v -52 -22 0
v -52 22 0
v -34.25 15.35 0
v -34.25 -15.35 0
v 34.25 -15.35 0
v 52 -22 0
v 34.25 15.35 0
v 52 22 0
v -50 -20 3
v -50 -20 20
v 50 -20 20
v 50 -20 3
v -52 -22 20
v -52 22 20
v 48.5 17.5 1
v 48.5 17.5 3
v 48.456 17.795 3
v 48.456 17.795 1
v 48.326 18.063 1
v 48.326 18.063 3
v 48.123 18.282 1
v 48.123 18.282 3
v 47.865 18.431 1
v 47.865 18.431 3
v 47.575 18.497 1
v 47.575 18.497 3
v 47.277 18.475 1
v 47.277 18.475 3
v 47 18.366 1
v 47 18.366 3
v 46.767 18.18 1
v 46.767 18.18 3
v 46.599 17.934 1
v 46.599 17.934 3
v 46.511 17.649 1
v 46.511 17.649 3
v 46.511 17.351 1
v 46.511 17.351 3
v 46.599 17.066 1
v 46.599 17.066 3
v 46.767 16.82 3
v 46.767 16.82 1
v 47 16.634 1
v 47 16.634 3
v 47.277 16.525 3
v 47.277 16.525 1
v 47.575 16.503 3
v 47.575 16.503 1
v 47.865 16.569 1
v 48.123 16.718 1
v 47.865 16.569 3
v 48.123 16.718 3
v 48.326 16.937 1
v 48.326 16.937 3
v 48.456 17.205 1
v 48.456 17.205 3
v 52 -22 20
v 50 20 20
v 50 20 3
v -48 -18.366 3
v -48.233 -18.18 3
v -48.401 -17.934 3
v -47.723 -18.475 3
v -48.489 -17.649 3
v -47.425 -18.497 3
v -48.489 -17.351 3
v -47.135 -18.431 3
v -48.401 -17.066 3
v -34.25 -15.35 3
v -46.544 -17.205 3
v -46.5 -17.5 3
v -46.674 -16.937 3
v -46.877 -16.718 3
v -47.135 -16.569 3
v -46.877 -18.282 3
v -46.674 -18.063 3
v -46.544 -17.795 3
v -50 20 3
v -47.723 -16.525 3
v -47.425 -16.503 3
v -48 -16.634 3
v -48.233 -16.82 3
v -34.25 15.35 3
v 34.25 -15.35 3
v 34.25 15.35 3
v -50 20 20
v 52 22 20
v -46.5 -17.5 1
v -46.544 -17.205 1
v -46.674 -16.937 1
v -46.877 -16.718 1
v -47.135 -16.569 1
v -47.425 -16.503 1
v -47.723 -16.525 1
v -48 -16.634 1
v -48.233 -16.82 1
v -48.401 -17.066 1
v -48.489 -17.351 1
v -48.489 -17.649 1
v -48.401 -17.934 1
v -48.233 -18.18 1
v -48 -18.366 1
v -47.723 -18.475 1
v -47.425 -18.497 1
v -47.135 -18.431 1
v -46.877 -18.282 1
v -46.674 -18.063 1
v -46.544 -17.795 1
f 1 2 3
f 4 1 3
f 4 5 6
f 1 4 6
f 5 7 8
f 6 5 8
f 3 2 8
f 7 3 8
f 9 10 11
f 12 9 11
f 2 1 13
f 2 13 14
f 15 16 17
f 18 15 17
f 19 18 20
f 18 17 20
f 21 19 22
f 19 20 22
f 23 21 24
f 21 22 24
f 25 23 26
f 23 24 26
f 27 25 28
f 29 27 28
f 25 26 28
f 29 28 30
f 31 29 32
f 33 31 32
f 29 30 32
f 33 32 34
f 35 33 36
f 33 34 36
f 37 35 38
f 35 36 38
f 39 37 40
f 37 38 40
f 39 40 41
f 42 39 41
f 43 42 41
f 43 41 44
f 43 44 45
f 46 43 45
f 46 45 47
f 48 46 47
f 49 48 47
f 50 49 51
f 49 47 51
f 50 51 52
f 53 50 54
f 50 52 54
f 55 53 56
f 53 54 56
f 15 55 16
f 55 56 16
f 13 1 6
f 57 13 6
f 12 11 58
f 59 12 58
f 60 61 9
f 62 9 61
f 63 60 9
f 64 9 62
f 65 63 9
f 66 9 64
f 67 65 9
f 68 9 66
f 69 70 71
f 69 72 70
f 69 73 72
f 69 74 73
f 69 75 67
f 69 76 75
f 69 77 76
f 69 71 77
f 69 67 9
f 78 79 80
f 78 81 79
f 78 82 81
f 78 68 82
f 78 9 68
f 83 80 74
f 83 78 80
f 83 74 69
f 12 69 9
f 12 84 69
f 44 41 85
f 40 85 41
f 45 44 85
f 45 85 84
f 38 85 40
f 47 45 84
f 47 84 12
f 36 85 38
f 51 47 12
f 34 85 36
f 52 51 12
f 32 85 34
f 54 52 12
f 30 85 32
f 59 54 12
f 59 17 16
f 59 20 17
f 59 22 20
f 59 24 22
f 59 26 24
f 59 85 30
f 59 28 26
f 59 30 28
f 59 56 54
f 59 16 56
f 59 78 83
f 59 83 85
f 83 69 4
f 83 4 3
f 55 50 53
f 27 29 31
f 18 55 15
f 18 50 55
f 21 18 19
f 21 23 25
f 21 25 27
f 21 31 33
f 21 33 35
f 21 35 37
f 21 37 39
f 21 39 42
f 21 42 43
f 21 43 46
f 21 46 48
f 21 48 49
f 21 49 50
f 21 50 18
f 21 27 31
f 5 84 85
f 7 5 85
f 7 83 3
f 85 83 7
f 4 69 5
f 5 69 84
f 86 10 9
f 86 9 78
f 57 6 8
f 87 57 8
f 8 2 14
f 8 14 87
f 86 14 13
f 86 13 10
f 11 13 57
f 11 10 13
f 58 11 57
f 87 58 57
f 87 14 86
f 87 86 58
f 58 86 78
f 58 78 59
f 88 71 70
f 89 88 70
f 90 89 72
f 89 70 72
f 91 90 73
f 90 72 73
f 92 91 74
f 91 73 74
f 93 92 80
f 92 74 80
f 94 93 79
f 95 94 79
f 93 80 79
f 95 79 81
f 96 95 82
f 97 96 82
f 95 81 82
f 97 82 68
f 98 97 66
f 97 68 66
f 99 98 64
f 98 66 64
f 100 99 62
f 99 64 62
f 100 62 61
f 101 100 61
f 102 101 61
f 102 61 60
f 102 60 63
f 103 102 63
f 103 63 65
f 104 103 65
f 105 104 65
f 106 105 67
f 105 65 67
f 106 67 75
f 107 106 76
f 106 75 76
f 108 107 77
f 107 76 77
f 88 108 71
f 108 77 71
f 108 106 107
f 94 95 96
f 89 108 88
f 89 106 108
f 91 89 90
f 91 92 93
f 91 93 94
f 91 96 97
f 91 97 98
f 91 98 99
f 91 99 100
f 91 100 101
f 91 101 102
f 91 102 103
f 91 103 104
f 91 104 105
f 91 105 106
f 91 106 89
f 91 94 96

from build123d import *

# Parameters (mm, degrees)
SKETCH_W        = 104
SKETCH_H        = 44
PAD_DEPTH       = 20
SKETCH001_W     = 100
SKETCH001_H     = 40
POCKET_DEPTH    = 17
SKETCH002_W     = 68.5
SKETCH002_H     = 30.7
POCKET001_DEPTH = 3
SKETCH003_R     = 1
POCKET002_DEPTH = 2


with BuildPart() as part:
    # Sketch → Pad (new body)
    with BuildSketch(Plane.XY):
        Rectangle(SKETCH_W, SKETCH_H)
    extrude(amount=PAD_DEPTH)

    # Sketch001 (on Face6 of Pad) → Pocket (cut)
    with BuildSketch(Plane.XY.offset(20)):
        Rectangle(SKETCH001_W, SKETCH001_H)
    extrude(amount=-POCKET_DEPTH, mode=Mode.SUBTRACT)

    # Sketch002 (on Face11 of Pocket) → Pocket001 (cut)
    with BuildSketch(Plane.XY.offset(3)):
        Rectangle(SKETCH002_W, SKETCH002_H)
    extrude(amount=-POCKET001_DEPTH, mode=Mode.SUBTRACT)

    # Sketch003 (on Face15 of Pocket001) → Pocket002 (cut)
    with BuildSketch(Plane.XY.offset(3)):
        with Locations((47.5, 17.5)):
            Circle(SKETCH003_R)
        with Locations((-47.5, -17.5)):
            Circle(SKETCH003_R)
    extrude(amount=-POCKET002_DEPTH, mode=Mode.SUBTRACT)


solid = part.part
